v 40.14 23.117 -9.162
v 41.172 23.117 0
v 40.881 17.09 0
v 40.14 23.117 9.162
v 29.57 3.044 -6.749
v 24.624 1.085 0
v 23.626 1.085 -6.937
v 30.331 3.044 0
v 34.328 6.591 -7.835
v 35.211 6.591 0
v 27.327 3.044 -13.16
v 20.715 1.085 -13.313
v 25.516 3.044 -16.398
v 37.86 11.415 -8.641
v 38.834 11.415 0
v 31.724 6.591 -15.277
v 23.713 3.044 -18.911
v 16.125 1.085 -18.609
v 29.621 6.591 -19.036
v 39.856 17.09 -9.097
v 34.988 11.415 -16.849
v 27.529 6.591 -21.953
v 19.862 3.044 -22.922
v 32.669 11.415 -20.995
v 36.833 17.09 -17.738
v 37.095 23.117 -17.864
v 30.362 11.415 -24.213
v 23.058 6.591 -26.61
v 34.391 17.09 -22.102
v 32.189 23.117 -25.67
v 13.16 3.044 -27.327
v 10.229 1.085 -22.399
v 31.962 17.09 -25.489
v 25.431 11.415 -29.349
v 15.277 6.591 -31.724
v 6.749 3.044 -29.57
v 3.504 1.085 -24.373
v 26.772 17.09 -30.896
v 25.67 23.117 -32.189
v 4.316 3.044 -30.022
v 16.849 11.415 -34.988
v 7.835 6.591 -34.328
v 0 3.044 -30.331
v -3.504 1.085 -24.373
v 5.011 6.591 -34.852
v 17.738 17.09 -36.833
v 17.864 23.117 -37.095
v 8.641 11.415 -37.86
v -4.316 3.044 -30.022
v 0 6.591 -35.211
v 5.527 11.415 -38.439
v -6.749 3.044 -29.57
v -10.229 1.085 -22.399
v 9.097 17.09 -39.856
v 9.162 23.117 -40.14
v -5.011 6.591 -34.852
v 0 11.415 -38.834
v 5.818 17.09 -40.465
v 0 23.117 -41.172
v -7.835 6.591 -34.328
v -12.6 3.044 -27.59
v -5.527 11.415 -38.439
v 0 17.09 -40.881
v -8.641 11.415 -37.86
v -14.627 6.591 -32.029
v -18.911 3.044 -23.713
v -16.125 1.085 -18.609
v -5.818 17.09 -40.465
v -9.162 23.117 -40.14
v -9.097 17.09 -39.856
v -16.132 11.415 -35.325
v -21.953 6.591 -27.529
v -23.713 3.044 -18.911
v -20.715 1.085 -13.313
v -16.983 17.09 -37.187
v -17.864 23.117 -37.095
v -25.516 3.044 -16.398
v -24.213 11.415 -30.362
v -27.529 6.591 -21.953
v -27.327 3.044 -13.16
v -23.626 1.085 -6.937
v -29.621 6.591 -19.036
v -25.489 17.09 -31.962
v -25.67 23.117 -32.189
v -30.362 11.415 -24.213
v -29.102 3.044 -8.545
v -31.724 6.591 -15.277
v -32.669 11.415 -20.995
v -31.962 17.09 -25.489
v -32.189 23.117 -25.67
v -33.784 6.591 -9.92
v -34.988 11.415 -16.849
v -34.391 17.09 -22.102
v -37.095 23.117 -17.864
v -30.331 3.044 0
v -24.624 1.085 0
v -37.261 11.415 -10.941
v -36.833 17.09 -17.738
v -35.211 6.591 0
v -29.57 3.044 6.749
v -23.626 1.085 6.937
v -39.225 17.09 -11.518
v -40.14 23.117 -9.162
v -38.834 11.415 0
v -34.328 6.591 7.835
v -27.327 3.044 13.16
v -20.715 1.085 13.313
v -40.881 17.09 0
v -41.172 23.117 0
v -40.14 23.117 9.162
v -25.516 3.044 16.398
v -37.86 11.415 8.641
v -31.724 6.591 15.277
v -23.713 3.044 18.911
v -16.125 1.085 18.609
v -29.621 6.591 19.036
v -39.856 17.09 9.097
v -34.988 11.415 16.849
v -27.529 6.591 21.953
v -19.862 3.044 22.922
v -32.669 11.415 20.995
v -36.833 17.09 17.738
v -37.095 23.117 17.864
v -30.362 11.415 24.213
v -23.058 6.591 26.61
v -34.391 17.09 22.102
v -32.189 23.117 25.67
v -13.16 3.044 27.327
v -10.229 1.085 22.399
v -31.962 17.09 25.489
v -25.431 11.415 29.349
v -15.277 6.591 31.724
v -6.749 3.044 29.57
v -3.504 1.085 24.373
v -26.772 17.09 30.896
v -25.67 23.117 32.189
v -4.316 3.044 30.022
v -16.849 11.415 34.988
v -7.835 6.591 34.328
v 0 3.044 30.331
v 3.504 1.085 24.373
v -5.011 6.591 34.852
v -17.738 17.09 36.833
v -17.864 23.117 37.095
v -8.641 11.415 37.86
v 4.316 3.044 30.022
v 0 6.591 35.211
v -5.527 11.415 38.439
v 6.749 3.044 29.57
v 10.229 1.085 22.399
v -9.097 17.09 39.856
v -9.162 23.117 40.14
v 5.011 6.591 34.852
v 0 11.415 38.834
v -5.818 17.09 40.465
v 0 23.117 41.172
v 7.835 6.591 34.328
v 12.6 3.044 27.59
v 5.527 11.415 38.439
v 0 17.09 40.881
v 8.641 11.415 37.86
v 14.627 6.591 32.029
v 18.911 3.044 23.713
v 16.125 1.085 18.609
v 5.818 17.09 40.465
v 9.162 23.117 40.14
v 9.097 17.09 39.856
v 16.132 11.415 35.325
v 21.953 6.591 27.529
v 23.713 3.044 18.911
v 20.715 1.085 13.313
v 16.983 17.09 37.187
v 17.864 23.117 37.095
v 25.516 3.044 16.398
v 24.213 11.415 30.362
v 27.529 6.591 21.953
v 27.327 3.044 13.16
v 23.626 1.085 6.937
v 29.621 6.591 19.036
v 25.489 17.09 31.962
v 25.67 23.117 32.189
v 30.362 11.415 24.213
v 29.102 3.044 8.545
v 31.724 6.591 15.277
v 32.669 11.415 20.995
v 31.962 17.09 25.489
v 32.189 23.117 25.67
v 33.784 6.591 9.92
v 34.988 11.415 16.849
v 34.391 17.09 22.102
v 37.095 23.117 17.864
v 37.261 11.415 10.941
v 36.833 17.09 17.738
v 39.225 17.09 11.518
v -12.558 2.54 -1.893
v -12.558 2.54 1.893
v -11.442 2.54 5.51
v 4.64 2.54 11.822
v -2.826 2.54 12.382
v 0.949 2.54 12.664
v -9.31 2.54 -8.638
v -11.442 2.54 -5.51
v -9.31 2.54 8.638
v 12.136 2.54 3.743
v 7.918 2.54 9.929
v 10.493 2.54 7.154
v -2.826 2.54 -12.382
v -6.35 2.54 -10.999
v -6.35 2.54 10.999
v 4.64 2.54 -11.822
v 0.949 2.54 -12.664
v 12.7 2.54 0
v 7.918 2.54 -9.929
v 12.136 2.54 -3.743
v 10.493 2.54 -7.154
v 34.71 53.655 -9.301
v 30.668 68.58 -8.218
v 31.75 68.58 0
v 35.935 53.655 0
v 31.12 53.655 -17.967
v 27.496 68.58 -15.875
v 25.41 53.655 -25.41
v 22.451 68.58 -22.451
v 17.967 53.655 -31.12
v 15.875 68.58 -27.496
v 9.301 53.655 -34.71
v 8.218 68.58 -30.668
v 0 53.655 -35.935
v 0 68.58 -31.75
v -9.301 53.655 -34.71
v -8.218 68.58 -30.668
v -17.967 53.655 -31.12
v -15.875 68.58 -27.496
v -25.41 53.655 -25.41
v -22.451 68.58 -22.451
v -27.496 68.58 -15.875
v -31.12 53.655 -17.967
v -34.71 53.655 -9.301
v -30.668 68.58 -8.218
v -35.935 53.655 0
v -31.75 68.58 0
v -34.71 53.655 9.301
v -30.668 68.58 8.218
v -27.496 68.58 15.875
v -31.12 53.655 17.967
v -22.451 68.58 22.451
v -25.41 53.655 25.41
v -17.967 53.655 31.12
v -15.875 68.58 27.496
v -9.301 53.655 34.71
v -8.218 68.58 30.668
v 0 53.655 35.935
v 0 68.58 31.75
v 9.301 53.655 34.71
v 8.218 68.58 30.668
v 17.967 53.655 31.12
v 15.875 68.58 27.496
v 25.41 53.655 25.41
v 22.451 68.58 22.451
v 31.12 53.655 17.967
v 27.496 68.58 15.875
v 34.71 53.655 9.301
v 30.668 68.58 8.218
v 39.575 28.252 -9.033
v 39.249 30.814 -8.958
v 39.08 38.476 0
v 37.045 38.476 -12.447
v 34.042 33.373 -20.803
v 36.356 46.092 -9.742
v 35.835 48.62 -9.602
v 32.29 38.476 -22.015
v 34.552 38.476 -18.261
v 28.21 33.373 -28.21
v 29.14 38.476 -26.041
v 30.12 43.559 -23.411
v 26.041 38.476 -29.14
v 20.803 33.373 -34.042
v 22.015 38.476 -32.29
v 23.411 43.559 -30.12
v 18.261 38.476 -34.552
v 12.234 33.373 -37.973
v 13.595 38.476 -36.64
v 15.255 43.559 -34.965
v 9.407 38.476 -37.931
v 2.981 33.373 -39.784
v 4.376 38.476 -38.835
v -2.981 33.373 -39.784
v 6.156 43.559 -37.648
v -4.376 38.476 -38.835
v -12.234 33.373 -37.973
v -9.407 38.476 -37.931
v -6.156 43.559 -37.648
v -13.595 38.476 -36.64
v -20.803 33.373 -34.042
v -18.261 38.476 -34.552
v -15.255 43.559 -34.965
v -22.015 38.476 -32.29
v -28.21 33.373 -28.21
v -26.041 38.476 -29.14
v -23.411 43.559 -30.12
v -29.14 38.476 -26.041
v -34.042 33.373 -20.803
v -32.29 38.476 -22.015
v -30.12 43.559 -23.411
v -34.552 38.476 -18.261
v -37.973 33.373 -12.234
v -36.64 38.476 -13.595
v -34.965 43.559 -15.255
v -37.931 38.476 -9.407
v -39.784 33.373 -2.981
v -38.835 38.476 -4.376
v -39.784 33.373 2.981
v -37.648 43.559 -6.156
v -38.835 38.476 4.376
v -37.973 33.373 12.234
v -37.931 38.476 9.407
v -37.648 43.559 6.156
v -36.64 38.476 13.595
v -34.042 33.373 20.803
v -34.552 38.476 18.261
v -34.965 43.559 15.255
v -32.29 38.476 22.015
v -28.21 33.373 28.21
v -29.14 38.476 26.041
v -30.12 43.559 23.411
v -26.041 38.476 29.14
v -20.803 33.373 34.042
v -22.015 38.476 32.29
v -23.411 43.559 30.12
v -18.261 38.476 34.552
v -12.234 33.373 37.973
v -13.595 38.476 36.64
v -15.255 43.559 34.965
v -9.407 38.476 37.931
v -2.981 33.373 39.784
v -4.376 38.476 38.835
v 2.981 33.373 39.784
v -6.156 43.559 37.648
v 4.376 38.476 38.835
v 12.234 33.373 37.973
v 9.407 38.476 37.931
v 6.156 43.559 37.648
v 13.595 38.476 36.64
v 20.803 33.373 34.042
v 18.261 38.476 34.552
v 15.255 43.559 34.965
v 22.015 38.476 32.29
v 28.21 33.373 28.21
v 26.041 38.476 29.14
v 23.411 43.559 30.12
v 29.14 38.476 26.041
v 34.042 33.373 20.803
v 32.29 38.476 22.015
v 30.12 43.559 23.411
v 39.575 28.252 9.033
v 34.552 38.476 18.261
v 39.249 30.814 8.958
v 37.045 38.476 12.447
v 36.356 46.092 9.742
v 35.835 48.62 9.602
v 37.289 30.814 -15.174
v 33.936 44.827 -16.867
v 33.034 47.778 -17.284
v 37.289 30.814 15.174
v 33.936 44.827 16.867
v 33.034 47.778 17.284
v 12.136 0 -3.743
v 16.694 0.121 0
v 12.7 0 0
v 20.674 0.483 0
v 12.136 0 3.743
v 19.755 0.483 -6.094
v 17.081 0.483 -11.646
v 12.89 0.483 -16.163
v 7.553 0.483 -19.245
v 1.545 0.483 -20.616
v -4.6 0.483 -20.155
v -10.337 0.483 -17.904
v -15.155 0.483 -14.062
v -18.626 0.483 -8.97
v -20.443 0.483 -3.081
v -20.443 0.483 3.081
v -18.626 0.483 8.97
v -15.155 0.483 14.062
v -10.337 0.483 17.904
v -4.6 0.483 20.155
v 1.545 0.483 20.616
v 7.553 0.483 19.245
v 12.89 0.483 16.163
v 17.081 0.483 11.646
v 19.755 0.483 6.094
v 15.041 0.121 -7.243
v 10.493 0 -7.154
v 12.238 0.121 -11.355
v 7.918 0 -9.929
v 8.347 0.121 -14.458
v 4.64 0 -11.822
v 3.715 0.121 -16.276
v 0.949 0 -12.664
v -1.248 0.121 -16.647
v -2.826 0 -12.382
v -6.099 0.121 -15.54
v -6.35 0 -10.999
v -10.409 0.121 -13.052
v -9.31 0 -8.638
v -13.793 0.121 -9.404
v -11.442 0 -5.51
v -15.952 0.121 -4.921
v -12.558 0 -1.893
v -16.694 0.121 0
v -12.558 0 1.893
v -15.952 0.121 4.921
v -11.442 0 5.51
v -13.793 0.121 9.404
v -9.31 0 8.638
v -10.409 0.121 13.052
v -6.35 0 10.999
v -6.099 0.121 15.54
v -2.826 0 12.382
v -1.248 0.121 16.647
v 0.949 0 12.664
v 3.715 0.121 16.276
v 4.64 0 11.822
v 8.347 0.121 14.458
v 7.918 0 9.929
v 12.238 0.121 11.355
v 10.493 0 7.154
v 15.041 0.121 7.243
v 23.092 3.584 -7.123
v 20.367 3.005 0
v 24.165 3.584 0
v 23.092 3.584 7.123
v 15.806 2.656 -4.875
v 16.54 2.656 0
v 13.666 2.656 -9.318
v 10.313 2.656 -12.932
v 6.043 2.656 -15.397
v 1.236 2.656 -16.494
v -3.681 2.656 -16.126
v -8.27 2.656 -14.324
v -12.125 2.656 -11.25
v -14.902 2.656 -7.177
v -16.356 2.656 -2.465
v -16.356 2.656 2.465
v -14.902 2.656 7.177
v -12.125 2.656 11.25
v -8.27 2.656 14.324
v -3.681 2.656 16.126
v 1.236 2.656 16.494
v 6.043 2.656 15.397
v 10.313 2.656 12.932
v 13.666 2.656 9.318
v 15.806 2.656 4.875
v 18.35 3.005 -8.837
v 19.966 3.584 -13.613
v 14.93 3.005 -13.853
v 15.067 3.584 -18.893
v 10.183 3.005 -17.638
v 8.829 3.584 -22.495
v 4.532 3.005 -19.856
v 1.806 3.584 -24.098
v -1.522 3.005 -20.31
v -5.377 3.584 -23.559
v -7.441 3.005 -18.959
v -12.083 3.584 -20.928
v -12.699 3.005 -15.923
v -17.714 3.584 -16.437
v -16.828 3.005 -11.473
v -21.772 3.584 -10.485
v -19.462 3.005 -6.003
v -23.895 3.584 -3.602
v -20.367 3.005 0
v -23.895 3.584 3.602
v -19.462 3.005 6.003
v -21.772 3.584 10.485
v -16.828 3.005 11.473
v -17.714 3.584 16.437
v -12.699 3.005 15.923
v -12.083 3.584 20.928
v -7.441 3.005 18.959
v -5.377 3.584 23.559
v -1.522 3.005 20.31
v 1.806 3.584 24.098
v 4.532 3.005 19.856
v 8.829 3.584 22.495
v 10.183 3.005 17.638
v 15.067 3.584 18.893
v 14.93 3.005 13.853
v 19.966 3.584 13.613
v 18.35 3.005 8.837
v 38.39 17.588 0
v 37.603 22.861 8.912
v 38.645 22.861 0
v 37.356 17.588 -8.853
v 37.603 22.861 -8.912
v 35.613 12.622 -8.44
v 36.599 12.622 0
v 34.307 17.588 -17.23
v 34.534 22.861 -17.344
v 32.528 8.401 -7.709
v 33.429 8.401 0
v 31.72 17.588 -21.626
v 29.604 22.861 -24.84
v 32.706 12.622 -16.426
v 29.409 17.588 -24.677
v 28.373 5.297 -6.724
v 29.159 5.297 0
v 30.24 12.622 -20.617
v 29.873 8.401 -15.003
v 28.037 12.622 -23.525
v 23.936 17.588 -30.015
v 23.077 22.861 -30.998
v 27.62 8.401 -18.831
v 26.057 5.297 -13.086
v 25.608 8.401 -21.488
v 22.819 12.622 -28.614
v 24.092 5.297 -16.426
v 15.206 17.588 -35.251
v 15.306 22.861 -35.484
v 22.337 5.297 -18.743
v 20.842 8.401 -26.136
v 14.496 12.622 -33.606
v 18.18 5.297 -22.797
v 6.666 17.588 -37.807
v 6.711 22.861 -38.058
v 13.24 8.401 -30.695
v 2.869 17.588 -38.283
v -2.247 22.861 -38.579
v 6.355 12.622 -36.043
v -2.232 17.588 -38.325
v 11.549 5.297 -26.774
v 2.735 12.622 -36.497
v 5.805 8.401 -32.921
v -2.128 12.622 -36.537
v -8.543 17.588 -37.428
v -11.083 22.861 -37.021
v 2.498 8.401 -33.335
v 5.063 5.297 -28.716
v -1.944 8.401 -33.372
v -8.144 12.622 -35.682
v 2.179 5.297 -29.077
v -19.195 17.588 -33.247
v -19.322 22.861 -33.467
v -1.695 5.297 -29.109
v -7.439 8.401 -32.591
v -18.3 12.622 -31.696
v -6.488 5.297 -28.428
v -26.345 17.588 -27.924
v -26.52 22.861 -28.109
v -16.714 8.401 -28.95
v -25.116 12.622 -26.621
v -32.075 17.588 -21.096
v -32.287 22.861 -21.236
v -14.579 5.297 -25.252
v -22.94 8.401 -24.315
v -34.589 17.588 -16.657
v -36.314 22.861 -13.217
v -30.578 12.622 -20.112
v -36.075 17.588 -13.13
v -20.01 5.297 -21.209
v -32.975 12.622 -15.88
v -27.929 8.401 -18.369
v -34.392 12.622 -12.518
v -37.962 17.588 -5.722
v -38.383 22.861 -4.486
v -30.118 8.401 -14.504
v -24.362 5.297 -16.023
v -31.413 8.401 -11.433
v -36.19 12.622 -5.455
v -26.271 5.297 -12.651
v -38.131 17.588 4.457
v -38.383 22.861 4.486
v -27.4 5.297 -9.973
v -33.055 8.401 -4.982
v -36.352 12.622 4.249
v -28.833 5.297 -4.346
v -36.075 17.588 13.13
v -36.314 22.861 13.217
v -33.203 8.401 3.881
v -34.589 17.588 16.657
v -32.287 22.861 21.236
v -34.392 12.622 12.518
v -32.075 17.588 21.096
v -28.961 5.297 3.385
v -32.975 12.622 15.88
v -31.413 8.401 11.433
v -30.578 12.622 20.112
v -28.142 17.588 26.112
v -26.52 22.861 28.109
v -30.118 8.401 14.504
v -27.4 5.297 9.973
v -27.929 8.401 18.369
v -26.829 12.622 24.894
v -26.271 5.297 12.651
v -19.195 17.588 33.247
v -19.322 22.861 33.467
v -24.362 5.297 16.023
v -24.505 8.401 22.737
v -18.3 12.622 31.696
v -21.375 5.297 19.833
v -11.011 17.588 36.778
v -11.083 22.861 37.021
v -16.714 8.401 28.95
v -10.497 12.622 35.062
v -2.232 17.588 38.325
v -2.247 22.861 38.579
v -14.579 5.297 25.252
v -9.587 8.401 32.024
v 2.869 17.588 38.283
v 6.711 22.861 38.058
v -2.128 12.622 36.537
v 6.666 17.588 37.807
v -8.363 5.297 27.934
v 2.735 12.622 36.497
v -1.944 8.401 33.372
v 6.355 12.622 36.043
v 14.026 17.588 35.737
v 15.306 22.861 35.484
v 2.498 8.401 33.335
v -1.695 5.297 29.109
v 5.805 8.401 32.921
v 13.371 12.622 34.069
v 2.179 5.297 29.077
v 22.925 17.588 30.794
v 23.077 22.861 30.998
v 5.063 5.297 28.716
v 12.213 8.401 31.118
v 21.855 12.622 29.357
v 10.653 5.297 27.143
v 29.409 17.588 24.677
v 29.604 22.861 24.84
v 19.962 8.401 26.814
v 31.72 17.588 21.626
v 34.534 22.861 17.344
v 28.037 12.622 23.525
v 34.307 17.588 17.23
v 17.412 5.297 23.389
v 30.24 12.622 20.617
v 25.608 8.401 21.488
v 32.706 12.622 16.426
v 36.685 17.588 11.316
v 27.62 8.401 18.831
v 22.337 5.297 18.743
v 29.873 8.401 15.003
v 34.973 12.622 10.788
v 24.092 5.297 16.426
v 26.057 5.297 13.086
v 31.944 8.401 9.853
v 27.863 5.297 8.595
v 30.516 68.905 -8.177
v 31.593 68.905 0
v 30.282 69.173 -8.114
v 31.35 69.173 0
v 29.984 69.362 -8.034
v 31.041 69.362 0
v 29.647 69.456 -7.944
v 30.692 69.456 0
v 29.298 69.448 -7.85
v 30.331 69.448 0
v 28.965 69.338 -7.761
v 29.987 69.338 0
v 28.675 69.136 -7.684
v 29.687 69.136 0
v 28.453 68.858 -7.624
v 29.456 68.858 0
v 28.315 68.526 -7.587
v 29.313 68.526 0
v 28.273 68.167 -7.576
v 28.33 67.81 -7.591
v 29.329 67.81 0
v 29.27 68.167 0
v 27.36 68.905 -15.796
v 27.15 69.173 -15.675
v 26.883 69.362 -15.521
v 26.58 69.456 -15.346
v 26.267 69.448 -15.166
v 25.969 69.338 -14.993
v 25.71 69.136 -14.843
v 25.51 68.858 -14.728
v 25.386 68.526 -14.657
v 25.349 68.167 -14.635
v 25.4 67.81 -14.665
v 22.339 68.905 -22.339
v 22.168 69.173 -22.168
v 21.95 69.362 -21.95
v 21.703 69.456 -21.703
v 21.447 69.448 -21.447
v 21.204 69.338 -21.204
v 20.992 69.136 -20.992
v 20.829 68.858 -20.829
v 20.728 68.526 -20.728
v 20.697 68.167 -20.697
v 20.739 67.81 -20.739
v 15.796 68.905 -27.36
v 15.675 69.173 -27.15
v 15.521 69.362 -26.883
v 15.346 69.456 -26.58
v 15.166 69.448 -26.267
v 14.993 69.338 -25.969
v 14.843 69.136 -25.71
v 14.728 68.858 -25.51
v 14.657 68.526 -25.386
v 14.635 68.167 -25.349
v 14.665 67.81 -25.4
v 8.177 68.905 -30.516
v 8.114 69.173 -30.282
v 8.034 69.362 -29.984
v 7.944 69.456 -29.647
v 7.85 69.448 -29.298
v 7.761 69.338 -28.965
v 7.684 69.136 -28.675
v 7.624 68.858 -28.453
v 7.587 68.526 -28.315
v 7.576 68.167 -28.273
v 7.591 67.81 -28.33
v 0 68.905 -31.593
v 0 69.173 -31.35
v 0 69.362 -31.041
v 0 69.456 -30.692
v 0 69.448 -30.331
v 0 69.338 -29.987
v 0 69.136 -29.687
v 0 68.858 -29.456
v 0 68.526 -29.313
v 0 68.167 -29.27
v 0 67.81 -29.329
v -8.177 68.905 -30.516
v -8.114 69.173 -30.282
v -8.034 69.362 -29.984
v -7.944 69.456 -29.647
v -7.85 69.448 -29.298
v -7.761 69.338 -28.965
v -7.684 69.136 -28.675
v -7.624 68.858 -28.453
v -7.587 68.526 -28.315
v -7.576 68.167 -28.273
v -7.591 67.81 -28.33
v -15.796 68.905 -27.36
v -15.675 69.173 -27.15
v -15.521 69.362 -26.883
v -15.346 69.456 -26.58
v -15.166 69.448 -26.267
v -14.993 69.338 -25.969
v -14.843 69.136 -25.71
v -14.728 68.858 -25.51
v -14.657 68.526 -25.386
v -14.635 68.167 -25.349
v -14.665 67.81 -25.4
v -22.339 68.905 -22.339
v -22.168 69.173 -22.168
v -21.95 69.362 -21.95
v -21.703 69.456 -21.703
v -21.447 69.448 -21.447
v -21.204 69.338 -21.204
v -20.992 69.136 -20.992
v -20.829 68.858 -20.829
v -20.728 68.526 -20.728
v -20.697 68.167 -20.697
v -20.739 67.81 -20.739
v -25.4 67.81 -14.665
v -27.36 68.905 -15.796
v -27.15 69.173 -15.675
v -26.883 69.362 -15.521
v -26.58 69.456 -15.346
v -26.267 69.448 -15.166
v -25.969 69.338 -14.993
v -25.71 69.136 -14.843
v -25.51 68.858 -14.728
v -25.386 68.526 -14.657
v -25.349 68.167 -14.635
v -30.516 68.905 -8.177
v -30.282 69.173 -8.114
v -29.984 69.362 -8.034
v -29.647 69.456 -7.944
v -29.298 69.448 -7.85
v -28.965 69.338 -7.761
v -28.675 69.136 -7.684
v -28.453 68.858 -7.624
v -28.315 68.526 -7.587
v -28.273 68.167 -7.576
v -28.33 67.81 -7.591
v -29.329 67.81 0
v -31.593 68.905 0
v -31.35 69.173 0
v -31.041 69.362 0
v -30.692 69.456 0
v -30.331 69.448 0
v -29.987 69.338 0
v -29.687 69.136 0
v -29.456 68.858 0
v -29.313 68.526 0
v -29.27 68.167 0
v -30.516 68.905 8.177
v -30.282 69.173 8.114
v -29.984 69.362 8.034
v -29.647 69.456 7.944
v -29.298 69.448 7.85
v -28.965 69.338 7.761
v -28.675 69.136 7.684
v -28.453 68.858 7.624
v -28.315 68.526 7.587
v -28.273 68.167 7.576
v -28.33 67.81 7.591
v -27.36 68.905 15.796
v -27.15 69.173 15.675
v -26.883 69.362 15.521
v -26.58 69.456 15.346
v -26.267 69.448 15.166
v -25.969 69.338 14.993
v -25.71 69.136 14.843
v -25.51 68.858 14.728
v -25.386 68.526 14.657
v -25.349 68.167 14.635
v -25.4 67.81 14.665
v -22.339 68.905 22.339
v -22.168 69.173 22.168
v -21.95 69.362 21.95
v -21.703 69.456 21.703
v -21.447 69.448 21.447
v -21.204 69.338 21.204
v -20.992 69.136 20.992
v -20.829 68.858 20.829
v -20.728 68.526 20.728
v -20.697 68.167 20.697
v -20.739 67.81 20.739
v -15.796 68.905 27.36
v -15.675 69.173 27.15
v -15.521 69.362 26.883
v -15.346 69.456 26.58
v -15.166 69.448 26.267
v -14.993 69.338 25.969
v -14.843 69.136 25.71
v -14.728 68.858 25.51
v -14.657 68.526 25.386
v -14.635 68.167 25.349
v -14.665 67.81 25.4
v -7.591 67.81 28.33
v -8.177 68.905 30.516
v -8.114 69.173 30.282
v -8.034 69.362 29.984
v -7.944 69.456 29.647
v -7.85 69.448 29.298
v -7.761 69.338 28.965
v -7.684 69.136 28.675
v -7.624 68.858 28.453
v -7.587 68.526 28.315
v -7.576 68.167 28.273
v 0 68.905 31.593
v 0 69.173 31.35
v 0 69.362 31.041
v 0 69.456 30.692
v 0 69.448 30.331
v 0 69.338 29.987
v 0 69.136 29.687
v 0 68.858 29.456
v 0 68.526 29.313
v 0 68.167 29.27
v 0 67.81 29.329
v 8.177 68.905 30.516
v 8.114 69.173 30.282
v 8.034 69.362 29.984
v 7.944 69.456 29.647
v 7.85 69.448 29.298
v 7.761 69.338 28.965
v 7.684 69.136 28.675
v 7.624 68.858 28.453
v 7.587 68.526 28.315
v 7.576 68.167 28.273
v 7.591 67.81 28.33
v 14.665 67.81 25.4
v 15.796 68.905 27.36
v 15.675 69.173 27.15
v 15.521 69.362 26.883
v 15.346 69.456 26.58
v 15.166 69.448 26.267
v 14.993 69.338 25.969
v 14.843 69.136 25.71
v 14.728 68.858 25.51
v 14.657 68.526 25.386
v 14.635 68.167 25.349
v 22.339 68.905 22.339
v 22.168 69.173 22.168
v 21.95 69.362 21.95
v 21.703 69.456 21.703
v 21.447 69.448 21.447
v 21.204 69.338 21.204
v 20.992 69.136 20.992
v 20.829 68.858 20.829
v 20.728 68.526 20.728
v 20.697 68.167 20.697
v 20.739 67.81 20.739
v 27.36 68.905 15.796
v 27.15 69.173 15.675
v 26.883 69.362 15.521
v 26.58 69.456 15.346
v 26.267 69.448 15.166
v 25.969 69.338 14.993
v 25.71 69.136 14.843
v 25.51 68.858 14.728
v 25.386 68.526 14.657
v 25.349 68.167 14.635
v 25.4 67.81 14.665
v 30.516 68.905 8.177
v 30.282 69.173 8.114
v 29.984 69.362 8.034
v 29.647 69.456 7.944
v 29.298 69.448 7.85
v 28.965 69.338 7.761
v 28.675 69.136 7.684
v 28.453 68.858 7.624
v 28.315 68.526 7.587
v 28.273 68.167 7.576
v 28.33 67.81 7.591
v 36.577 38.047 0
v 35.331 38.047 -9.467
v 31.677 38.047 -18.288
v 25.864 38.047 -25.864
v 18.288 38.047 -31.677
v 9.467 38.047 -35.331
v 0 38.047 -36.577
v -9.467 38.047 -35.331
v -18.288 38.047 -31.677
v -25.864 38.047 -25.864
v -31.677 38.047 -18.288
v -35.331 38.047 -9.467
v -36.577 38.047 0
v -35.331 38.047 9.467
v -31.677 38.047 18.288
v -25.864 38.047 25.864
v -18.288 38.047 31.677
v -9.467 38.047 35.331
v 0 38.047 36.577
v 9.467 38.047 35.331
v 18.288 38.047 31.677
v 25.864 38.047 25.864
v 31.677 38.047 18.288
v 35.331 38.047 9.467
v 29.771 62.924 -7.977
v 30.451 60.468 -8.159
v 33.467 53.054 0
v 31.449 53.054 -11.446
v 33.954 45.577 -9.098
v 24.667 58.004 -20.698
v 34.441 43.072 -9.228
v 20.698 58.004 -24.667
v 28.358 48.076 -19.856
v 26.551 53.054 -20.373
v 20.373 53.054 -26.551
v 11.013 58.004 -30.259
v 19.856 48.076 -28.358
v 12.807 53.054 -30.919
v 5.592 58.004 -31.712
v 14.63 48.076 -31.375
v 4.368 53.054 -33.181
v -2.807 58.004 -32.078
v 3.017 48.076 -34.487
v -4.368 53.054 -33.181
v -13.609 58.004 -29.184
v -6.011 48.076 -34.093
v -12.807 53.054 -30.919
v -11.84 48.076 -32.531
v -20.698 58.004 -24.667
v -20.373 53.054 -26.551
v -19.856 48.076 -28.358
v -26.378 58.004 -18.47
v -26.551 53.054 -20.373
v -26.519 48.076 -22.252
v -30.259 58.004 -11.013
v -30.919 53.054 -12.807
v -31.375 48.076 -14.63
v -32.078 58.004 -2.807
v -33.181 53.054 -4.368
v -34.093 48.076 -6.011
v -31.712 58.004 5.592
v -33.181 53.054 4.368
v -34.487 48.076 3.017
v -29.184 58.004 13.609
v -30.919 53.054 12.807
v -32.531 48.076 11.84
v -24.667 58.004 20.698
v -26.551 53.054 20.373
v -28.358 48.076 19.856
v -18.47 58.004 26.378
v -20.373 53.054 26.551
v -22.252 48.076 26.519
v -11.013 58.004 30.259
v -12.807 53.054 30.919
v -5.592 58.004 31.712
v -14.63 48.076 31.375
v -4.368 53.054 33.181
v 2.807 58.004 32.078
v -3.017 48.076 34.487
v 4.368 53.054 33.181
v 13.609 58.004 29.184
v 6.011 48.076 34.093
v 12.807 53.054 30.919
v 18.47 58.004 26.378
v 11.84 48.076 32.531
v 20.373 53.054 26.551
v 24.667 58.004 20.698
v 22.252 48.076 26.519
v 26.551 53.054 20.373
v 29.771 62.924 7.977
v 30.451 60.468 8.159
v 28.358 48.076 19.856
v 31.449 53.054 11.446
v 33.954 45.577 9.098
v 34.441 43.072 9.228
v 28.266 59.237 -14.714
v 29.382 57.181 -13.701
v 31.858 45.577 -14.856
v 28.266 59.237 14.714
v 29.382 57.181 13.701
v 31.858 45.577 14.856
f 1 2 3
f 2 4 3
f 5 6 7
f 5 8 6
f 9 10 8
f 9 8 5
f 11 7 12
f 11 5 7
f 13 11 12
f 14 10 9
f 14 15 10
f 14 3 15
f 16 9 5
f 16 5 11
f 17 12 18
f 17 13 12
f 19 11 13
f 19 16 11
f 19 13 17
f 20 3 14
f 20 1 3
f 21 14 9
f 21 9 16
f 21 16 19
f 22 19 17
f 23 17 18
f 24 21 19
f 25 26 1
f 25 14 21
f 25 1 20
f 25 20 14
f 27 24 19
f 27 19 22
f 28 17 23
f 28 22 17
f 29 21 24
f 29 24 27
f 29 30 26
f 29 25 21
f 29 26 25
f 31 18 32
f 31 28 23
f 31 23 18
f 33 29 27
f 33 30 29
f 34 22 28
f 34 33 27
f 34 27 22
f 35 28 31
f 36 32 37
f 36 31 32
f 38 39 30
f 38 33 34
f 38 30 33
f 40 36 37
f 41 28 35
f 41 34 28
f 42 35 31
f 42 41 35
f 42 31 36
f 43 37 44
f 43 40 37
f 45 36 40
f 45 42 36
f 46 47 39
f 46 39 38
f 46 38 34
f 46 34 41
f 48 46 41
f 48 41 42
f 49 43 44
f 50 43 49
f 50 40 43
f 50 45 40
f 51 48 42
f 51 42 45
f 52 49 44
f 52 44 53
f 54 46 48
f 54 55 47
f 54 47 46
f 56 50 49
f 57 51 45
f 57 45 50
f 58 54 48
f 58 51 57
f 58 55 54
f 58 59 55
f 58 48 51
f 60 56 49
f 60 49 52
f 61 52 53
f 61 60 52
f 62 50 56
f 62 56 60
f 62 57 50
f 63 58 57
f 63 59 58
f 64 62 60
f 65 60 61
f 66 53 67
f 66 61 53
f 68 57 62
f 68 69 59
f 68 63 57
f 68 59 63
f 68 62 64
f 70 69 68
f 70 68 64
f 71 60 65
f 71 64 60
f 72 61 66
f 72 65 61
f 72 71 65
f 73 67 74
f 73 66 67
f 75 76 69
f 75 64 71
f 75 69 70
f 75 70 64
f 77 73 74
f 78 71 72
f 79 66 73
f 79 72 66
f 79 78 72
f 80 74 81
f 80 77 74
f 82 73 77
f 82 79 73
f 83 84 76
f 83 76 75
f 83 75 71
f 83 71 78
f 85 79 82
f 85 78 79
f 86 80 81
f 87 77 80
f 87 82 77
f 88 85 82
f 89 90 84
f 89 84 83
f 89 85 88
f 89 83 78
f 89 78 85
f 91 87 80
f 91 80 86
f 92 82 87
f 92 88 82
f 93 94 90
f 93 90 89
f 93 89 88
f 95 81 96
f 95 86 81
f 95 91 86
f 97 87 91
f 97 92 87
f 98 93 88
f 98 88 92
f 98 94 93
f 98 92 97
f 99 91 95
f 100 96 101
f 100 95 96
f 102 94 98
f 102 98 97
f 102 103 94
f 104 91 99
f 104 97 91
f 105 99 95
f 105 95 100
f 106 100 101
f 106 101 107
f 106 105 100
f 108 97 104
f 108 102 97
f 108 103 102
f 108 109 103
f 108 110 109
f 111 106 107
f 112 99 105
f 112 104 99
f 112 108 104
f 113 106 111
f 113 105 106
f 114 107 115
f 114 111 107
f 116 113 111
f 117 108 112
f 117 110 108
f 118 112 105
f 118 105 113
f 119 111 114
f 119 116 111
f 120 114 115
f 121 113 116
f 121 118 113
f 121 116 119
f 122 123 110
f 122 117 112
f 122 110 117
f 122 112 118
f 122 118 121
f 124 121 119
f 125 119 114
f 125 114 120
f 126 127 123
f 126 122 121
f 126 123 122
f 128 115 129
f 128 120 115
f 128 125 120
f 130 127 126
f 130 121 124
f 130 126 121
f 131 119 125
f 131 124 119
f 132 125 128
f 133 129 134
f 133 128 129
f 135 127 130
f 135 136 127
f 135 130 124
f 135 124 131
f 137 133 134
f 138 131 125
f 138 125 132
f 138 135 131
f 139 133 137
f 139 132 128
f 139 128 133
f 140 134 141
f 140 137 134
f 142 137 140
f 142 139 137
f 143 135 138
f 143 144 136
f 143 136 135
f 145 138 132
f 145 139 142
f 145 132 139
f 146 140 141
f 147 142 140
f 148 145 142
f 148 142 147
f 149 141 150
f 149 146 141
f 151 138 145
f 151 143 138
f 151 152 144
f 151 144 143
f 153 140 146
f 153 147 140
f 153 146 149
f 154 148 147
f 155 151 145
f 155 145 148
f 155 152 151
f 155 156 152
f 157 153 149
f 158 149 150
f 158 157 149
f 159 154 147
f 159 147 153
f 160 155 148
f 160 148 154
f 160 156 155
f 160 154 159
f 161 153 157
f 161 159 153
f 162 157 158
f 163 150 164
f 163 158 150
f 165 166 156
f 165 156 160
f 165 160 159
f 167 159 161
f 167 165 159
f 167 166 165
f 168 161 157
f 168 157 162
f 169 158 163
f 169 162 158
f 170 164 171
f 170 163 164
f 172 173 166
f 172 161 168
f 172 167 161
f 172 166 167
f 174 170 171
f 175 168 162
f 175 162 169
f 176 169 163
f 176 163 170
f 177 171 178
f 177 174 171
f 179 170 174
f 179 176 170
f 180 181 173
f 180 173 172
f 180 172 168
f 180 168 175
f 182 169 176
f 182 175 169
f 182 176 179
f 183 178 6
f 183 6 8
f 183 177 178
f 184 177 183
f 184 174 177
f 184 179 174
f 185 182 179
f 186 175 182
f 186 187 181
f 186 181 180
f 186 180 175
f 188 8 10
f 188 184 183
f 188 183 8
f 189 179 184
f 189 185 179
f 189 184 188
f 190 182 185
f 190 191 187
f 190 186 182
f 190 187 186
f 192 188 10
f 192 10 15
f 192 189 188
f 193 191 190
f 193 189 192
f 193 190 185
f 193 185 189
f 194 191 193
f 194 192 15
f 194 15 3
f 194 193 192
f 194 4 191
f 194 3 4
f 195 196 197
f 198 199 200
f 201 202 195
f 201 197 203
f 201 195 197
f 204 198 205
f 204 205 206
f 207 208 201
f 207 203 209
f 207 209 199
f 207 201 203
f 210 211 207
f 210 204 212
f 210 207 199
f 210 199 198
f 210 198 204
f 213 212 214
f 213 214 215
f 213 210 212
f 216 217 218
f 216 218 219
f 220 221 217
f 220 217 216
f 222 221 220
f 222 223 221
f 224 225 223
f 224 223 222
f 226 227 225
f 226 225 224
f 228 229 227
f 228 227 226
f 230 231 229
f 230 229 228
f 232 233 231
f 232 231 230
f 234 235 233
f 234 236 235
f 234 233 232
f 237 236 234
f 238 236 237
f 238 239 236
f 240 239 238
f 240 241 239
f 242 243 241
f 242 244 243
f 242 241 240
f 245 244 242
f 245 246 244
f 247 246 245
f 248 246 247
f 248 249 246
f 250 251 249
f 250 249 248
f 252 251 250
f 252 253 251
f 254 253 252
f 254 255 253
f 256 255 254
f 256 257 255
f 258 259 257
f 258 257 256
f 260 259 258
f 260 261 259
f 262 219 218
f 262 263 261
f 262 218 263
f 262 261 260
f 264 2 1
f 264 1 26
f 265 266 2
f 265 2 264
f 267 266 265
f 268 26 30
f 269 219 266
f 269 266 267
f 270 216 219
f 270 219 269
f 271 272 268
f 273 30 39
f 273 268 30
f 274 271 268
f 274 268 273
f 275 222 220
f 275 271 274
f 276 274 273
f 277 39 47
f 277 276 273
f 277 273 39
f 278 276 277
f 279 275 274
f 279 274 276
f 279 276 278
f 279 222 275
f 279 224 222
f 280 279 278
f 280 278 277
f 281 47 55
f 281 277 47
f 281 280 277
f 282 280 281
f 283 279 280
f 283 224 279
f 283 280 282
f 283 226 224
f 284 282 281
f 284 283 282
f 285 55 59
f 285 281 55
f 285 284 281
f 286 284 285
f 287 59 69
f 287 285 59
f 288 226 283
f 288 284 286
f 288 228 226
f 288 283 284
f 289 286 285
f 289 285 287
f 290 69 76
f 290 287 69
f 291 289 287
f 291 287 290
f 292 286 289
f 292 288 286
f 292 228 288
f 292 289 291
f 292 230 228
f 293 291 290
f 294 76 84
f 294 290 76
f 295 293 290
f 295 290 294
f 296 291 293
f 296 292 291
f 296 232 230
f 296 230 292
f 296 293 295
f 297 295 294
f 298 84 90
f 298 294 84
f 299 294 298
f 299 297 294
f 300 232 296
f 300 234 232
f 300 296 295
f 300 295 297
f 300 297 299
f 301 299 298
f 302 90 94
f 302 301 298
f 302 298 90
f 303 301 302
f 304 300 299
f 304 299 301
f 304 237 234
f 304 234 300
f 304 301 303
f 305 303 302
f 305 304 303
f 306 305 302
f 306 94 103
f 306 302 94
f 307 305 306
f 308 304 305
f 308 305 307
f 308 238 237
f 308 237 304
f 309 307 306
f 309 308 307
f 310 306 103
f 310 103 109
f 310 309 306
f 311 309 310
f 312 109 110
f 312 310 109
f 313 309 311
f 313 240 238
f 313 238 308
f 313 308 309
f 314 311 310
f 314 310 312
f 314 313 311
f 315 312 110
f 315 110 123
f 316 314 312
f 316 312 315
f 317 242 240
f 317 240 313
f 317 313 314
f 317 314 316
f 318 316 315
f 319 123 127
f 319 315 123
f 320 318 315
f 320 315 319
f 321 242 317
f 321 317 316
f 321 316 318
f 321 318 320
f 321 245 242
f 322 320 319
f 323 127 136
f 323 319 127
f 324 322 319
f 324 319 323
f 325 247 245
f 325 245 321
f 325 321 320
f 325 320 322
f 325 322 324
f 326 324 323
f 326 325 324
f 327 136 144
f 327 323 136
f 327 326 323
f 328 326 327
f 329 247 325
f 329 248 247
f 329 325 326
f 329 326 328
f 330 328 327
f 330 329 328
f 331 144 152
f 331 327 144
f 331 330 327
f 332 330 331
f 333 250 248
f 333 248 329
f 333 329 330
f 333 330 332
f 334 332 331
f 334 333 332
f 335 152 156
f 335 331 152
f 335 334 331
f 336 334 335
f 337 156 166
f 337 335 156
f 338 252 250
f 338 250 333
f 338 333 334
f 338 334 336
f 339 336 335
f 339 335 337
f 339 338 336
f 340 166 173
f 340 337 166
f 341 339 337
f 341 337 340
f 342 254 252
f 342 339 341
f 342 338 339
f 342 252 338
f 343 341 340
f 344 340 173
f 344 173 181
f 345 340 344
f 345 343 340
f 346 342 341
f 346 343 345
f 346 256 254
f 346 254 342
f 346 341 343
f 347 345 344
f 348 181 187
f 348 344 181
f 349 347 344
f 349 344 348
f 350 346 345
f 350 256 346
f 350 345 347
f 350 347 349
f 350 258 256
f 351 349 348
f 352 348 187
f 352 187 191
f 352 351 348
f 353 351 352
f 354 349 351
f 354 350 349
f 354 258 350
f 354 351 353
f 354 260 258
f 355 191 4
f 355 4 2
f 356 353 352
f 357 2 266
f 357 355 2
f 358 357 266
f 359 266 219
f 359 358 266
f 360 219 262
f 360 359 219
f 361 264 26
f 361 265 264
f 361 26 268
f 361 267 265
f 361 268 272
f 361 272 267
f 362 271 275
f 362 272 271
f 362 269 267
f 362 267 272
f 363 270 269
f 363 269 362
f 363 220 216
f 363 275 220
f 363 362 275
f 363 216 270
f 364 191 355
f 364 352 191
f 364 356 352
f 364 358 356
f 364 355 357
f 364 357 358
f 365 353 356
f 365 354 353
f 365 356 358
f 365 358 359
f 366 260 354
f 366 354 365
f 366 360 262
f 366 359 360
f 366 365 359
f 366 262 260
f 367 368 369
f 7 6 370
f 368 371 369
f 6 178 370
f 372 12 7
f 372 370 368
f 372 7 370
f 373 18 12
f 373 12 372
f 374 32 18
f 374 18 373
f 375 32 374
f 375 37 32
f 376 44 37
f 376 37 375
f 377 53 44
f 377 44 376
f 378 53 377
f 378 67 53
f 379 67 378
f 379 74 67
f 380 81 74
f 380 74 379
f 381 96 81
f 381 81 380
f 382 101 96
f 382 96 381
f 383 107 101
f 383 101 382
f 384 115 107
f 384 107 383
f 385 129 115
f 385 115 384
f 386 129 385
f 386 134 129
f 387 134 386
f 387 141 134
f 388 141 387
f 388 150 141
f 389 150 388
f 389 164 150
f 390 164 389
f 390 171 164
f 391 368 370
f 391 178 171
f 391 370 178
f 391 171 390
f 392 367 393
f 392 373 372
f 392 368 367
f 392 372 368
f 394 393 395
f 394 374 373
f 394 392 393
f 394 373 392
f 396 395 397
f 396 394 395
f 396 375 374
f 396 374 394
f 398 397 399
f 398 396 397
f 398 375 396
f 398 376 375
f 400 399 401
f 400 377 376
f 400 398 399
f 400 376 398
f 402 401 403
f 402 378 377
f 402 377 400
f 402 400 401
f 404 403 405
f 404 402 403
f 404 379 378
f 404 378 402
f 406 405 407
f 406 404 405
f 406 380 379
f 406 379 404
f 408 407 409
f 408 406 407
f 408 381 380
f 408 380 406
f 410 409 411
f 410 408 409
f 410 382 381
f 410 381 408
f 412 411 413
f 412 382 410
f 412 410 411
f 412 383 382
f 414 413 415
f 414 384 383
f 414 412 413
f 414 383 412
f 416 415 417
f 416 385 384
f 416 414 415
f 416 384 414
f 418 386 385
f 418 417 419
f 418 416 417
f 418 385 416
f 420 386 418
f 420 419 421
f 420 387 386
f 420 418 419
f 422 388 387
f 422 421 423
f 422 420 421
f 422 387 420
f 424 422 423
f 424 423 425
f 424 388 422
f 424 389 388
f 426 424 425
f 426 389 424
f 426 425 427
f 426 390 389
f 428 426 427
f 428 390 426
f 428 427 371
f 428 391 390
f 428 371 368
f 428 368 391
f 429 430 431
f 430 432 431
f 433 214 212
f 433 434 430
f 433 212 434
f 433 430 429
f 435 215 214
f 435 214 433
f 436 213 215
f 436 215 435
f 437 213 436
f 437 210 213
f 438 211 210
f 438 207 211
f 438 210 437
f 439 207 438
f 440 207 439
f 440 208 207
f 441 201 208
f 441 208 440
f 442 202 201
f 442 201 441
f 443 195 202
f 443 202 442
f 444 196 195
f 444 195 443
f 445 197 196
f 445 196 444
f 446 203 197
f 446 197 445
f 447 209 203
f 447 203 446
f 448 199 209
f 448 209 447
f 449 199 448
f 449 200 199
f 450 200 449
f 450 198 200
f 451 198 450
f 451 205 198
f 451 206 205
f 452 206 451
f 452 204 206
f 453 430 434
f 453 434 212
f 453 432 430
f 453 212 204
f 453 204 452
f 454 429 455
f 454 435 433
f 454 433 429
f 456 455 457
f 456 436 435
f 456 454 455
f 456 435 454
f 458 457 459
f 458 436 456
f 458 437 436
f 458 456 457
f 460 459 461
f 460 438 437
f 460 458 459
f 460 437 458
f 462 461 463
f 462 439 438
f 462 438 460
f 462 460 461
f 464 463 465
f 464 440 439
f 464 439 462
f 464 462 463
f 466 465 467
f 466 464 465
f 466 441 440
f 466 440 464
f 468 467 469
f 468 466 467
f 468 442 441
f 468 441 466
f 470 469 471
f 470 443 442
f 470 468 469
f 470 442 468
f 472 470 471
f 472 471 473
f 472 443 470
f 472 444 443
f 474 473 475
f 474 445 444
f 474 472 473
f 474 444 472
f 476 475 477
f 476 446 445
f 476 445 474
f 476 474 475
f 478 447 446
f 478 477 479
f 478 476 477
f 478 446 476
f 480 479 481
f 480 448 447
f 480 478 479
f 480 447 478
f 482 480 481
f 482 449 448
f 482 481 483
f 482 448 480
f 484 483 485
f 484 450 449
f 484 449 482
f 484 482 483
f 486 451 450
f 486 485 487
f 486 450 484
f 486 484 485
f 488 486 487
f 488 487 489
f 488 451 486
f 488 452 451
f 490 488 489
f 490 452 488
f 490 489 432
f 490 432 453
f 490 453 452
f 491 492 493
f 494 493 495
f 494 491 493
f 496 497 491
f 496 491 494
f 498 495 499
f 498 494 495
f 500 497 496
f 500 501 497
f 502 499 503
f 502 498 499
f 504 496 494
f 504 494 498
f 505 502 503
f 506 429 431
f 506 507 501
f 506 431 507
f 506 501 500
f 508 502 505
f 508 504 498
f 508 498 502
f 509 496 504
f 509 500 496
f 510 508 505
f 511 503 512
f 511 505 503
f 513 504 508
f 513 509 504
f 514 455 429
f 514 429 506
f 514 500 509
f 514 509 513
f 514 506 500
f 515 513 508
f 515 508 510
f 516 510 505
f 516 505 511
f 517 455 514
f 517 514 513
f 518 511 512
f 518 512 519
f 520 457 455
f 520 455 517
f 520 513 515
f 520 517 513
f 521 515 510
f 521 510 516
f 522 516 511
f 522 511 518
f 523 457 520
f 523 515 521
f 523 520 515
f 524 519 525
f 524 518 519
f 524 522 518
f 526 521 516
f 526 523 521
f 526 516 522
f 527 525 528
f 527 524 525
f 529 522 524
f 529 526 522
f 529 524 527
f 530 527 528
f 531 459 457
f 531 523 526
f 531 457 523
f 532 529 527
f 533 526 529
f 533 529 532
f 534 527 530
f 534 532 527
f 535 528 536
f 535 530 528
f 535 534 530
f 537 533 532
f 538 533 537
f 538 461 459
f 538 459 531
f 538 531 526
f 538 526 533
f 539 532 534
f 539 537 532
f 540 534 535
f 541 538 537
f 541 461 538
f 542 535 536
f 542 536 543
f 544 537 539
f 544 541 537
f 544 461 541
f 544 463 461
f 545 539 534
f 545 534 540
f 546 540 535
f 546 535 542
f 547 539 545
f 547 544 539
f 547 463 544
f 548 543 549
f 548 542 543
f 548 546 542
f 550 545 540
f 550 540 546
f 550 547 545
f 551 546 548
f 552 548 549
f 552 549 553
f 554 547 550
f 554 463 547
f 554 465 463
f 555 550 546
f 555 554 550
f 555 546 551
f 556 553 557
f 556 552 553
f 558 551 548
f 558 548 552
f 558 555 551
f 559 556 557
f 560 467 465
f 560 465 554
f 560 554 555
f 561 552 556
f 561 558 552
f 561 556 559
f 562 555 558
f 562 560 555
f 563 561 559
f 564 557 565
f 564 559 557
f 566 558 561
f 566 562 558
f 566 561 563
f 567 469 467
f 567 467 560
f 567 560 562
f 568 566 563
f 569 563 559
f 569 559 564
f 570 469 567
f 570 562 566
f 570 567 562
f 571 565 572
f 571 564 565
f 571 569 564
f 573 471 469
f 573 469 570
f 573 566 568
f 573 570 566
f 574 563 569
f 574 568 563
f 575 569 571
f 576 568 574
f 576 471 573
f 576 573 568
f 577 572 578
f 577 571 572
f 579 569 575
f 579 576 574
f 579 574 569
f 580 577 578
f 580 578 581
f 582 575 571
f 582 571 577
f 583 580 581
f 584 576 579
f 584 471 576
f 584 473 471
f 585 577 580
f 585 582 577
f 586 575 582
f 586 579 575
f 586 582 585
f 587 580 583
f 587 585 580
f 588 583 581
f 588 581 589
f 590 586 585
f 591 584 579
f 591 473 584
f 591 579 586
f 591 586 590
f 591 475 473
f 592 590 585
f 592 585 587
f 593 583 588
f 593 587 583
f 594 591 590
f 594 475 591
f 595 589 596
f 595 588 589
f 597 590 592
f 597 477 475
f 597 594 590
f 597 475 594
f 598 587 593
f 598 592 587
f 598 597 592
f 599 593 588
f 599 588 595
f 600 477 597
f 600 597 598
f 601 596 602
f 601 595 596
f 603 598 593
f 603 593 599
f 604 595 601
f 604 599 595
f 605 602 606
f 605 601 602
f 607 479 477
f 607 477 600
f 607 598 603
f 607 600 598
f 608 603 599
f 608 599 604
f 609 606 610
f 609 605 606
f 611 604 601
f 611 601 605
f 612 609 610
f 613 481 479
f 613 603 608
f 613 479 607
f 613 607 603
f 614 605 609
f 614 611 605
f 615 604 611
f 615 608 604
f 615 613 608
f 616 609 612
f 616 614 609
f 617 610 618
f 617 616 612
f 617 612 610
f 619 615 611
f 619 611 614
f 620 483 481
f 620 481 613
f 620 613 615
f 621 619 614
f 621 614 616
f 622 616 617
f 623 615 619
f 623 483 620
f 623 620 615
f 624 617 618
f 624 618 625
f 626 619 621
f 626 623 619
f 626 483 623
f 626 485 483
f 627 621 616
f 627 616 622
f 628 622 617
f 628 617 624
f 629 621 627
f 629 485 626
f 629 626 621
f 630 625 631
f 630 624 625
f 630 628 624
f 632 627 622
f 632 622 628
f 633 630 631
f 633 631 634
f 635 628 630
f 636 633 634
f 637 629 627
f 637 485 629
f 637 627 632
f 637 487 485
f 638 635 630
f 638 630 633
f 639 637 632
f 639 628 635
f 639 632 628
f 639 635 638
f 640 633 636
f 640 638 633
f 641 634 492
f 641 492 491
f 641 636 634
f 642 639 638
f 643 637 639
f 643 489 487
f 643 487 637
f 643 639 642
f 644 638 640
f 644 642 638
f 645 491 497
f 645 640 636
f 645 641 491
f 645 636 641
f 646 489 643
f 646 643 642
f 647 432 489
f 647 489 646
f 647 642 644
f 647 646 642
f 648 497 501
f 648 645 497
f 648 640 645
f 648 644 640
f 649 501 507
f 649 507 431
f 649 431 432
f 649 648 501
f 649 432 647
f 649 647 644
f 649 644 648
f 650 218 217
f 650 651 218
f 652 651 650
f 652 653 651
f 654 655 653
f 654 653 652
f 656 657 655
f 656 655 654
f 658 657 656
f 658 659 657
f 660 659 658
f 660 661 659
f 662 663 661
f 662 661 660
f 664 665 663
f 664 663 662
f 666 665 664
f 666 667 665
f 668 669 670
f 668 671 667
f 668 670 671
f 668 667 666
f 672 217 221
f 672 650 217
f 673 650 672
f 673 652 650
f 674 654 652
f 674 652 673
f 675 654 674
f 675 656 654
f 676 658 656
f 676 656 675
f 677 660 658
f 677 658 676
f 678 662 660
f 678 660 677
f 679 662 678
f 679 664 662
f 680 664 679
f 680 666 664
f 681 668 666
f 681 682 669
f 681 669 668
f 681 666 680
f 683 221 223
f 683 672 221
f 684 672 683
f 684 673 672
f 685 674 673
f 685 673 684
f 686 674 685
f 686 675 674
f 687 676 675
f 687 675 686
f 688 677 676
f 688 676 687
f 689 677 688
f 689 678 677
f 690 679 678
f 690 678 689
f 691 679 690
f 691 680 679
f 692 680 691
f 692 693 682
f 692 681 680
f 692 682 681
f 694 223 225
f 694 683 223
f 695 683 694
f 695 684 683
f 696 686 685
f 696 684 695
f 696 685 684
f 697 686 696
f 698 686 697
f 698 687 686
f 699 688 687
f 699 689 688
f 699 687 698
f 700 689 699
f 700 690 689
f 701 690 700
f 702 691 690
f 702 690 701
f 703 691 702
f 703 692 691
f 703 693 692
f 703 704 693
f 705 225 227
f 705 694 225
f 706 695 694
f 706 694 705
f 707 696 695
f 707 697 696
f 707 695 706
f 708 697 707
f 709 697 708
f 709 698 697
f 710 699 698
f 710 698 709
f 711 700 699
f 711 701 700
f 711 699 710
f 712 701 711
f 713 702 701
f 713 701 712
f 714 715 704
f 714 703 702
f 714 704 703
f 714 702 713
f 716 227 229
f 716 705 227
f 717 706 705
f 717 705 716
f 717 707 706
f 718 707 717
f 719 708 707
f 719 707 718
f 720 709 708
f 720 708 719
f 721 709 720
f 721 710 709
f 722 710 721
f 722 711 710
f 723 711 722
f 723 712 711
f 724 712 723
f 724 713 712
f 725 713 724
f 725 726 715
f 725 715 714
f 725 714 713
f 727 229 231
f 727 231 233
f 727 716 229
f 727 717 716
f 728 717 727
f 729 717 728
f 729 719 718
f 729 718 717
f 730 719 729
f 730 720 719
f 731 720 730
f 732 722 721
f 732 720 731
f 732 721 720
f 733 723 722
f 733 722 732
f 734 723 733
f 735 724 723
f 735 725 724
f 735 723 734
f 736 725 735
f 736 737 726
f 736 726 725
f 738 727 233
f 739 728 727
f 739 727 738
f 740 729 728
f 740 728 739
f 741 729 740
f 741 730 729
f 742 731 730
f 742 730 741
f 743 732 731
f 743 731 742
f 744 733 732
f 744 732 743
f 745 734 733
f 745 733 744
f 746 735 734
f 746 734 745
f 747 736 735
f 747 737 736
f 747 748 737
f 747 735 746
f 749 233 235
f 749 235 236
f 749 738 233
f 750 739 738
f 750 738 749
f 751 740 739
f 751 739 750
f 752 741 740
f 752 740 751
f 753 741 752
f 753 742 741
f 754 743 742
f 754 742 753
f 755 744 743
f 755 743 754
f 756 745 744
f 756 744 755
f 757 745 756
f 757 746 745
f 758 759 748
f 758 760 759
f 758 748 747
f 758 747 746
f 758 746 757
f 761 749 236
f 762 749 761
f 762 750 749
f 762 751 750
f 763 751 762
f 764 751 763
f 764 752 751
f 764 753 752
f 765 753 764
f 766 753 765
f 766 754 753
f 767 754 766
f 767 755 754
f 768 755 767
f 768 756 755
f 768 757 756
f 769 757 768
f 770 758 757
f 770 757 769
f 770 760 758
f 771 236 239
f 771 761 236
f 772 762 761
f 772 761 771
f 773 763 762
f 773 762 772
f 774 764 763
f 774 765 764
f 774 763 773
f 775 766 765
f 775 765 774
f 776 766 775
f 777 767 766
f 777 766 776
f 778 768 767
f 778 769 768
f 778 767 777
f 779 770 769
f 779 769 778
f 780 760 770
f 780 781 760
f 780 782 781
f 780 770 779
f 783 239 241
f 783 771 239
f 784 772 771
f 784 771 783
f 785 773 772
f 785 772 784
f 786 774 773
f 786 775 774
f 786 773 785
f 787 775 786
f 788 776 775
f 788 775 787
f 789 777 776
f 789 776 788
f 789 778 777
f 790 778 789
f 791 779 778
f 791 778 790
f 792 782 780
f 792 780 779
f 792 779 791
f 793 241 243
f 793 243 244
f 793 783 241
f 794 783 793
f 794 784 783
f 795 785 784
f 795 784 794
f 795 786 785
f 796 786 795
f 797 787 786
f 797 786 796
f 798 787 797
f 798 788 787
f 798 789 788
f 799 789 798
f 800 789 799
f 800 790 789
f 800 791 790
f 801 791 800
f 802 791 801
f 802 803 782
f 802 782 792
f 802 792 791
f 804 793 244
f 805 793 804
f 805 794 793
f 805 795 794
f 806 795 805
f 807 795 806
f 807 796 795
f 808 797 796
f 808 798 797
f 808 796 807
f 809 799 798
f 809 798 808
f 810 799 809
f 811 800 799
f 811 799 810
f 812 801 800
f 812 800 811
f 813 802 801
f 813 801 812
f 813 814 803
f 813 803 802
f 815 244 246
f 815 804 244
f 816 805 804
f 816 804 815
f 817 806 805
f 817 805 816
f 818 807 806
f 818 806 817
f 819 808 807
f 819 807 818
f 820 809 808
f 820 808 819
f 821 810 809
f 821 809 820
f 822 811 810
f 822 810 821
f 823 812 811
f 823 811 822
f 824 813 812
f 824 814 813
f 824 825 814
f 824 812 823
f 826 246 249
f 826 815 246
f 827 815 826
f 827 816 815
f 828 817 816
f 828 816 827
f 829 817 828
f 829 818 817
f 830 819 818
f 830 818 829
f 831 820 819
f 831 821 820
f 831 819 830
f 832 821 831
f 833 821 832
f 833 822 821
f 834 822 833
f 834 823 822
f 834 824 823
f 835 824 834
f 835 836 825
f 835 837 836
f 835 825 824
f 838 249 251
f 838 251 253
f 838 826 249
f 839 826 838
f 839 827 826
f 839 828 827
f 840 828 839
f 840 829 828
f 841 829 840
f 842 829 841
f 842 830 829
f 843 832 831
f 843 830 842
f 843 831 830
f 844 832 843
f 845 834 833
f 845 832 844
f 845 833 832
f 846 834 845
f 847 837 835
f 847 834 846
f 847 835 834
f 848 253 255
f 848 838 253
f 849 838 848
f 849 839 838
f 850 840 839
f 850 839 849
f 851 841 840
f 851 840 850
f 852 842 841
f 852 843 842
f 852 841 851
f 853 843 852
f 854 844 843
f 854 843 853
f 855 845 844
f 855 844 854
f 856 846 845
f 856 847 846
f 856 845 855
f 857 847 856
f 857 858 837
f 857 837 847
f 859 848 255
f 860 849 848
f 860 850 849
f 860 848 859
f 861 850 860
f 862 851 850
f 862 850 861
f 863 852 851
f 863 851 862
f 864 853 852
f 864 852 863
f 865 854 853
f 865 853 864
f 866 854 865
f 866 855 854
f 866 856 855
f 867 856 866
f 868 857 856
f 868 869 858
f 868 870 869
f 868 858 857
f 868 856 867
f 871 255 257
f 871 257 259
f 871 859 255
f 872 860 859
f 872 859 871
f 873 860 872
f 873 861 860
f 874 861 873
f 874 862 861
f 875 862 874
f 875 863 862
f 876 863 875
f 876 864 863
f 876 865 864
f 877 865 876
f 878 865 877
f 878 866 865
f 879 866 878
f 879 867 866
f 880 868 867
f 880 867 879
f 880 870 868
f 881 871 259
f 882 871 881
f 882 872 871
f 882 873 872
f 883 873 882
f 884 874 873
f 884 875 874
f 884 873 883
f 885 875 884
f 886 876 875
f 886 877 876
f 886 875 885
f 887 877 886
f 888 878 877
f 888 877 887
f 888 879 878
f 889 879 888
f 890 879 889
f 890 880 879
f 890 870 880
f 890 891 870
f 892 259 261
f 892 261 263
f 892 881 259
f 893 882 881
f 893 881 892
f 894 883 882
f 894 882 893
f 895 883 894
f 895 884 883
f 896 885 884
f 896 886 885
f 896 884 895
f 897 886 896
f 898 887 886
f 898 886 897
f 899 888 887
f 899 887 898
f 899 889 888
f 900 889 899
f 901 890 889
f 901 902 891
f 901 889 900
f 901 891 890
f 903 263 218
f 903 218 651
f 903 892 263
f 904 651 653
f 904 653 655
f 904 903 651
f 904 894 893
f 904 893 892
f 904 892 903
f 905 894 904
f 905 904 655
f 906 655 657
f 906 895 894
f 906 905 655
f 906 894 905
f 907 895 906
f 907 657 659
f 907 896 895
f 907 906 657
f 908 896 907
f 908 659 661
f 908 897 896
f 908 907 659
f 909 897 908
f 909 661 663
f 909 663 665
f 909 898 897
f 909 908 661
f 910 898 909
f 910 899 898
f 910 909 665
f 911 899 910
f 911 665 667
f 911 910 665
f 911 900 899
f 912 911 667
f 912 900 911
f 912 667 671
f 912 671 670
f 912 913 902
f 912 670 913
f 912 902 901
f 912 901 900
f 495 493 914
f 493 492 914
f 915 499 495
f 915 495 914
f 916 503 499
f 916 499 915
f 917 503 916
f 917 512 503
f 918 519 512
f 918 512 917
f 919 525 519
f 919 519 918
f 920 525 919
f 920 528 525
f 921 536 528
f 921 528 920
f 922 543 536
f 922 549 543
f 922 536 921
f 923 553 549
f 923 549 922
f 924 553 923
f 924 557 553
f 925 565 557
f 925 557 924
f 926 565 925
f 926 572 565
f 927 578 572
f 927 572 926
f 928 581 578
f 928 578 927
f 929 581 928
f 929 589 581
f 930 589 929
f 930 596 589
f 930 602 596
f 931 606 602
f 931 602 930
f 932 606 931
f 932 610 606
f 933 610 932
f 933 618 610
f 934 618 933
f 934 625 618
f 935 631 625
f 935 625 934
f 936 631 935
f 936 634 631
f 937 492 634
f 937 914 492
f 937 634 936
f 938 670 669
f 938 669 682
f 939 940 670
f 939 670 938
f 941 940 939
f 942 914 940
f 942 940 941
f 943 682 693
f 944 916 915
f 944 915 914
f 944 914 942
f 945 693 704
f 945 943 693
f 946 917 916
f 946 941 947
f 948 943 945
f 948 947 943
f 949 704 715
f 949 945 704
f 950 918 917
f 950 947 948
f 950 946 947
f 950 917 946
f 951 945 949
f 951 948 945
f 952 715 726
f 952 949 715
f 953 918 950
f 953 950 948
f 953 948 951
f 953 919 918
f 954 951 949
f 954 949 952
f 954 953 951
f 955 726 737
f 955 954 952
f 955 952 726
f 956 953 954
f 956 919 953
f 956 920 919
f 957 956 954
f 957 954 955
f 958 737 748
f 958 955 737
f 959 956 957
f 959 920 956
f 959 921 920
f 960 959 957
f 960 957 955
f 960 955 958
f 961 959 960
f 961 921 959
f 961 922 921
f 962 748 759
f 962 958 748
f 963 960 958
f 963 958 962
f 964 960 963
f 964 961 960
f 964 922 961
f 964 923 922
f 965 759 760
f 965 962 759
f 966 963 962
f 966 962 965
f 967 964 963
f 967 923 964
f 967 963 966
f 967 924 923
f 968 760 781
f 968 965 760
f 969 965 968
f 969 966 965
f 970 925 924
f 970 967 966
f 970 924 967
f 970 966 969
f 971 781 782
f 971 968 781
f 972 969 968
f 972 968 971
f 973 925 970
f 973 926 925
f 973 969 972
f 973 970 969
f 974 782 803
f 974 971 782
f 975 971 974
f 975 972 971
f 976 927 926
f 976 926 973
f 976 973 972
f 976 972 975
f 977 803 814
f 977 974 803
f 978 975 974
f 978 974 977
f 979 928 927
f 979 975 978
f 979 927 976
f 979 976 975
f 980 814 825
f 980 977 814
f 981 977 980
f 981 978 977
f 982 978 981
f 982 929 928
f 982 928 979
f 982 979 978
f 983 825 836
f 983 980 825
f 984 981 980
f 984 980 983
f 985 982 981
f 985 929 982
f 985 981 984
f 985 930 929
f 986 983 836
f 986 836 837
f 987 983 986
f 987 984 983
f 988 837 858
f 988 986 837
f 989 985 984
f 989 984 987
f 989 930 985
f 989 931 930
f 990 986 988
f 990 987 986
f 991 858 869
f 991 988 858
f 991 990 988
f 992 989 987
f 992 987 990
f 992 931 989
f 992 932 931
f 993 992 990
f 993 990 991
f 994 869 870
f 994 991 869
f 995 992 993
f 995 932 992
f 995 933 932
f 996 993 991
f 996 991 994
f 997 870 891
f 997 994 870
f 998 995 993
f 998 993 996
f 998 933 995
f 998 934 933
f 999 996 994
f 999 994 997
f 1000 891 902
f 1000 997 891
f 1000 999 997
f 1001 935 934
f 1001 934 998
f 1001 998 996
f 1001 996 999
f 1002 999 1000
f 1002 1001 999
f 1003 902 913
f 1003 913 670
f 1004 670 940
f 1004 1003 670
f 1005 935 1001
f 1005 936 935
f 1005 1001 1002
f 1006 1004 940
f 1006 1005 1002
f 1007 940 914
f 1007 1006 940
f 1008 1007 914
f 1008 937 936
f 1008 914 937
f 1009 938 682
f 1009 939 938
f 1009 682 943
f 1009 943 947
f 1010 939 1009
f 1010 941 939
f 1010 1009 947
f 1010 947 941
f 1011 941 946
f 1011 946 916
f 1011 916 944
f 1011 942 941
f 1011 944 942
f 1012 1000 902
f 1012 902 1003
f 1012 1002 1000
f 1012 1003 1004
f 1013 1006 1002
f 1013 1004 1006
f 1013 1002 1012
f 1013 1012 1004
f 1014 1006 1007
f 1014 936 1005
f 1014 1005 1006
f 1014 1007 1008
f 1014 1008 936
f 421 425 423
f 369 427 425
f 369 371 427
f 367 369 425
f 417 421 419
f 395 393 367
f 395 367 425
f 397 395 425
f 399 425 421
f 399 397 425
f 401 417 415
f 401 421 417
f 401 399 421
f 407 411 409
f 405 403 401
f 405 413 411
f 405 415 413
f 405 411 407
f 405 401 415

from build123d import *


with BuildPart() as part:
    # Sketch1 → Revolve1 (revolve)
    with BuildSketch(Plane.XY):
        with BuildLine():
            Line((0, 0), (12.7, 0))
            ThreePointArc((12.7, 0), (18.686592918, 0.271905112), (24.623888889, 1.085381429))
            ThreePointArc((24.623888889, 1.085381429), (37.202366298, 8.867914793), (41.171799597, 23.11675751))
            ThreePointArc((41.171799597, 23.11675751), (37.638540624, 46.092432968), (31.75, 68.58))
            ThreePointArc((31.75, 68.58), (30.154868715, 69.405443023), (29.329425692, 67.810311739))
            ThreePointArc((29.329425692, 67.810311739), (35.151388742, 45.576995764), (38.644699647, 22.861090061))
            ThreePointArc((38.644699647, 22.861090061), (35.171445511, 10.393352683), (24.165277778, 3.583635989))
            ThreePointArc((24.165277778, 3.583635989), (18.456339345, 2.801447223), (12.7, 2.54))
            Line((12.7, 2.54), (0, 2.54))
            Line((0, 2.54), (0, 0))
        make_face()
    revolve(axis=Axis((0, 0, 0), (0, 1, 0)))


solid = part.part
